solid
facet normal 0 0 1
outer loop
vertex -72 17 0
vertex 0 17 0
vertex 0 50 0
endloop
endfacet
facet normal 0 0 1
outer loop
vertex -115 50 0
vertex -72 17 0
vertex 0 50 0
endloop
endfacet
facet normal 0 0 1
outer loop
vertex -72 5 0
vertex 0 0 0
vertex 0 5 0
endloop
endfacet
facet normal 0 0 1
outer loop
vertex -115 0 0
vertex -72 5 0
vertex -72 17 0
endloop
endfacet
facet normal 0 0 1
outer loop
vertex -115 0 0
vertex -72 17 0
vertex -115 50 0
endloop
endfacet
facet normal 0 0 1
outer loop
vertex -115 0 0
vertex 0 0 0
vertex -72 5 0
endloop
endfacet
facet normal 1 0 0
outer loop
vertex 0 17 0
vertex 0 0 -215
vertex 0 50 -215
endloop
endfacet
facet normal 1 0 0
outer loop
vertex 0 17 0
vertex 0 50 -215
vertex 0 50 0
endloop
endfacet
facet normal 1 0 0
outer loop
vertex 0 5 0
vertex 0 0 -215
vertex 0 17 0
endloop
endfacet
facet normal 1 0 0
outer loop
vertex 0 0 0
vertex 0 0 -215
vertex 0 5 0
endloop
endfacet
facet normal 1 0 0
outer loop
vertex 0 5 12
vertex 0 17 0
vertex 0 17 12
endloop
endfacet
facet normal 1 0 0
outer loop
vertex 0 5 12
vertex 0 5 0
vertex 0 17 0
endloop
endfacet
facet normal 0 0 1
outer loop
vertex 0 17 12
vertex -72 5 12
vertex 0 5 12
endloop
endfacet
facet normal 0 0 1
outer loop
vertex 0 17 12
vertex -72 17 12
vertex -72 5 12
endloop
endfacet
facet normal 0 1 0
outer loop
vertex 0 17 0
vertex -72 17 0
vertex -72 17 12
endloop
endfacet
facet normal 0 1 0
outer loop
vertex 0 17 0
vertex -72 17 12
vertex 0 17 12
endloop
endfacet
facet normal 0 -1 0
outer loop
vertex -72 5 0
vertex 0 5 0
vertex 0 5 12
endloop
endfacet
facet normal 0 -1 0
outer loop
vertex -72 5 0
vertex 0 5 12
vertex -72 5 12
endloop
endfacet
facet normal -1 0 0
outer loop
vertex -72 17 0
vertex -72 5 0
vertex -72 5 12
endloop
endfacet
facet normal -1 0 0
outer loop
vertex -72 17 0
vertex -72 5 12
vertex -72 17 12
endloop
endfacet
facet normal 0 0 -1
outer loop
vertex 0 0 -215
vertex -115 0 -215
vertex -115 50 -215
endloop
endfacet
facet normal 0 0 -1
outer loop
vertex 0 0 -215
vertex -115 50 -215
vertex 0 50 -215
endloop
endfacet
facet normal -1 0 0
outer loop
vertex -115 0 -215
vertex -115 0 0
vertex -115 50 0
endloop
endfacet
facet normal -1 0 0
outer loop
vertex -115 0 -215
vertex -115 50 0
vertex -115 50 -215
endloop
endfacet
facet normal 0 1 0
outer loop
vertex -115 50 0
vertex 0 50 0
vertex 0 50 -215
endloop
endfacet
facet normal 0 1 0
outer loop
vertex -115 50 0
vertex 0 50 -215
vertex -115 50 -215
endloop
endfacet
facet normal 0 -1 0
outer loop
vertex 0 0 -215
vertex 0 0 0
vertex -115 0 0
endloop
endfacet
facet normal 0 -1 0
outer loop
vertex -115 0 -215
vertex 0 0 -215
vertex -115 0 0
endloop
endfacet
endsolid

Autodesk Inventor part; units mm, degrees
ref_plane "YZ Plane" through (0, 0, 0) normal (1, 0, 0) x (0, 1, 0)
ref_plane "XZ Plane" through (0, 0, 0) normal (0, 1, 0) x (-1, 0, 0)
ref_plane "XY Plane" through (0, 0, 0) normal (0, 0, 1) x (1, 0, 0)
sketch "Sketch1" plane through (0, 0, 0) normal (0, 1, 0) x (-1, 0, 0)
  line L0 (0, 0) -> (115, 0)
  line L1 (115, 0) -> (115, -215)
  line L2 (115, -215) -> (0, -215)
  line L3 (0, -215) -> (0, 0)
  dimension "d0" = 115
  dimension "d1" = 215
extrude "Extrusion1" add sketch "Sketch1" along normal blind 50
sketch "Sketch2" plane through (-115, 0, 0) normal (0, 0, 1) x (1, 0, 0)
  line L0 (115, 0) -> (115, 5)
  line L1 (115, 0) -> (115, 50) projected
  line L2 (115, 5) -> (43, 5)
  line L3 (43, 5) -> (43, 17)
  line L4 (43, 17) -> (115, 17)
  line L5 (115, 17) -> (115, 5)
  dimension "d4" = 5
  dimension "d5" = 72
  dimension "d6" = 12
extrude "Extrusion2" add sketch "Sketch2" along normal blind 12
properties part number "S-201-24"
